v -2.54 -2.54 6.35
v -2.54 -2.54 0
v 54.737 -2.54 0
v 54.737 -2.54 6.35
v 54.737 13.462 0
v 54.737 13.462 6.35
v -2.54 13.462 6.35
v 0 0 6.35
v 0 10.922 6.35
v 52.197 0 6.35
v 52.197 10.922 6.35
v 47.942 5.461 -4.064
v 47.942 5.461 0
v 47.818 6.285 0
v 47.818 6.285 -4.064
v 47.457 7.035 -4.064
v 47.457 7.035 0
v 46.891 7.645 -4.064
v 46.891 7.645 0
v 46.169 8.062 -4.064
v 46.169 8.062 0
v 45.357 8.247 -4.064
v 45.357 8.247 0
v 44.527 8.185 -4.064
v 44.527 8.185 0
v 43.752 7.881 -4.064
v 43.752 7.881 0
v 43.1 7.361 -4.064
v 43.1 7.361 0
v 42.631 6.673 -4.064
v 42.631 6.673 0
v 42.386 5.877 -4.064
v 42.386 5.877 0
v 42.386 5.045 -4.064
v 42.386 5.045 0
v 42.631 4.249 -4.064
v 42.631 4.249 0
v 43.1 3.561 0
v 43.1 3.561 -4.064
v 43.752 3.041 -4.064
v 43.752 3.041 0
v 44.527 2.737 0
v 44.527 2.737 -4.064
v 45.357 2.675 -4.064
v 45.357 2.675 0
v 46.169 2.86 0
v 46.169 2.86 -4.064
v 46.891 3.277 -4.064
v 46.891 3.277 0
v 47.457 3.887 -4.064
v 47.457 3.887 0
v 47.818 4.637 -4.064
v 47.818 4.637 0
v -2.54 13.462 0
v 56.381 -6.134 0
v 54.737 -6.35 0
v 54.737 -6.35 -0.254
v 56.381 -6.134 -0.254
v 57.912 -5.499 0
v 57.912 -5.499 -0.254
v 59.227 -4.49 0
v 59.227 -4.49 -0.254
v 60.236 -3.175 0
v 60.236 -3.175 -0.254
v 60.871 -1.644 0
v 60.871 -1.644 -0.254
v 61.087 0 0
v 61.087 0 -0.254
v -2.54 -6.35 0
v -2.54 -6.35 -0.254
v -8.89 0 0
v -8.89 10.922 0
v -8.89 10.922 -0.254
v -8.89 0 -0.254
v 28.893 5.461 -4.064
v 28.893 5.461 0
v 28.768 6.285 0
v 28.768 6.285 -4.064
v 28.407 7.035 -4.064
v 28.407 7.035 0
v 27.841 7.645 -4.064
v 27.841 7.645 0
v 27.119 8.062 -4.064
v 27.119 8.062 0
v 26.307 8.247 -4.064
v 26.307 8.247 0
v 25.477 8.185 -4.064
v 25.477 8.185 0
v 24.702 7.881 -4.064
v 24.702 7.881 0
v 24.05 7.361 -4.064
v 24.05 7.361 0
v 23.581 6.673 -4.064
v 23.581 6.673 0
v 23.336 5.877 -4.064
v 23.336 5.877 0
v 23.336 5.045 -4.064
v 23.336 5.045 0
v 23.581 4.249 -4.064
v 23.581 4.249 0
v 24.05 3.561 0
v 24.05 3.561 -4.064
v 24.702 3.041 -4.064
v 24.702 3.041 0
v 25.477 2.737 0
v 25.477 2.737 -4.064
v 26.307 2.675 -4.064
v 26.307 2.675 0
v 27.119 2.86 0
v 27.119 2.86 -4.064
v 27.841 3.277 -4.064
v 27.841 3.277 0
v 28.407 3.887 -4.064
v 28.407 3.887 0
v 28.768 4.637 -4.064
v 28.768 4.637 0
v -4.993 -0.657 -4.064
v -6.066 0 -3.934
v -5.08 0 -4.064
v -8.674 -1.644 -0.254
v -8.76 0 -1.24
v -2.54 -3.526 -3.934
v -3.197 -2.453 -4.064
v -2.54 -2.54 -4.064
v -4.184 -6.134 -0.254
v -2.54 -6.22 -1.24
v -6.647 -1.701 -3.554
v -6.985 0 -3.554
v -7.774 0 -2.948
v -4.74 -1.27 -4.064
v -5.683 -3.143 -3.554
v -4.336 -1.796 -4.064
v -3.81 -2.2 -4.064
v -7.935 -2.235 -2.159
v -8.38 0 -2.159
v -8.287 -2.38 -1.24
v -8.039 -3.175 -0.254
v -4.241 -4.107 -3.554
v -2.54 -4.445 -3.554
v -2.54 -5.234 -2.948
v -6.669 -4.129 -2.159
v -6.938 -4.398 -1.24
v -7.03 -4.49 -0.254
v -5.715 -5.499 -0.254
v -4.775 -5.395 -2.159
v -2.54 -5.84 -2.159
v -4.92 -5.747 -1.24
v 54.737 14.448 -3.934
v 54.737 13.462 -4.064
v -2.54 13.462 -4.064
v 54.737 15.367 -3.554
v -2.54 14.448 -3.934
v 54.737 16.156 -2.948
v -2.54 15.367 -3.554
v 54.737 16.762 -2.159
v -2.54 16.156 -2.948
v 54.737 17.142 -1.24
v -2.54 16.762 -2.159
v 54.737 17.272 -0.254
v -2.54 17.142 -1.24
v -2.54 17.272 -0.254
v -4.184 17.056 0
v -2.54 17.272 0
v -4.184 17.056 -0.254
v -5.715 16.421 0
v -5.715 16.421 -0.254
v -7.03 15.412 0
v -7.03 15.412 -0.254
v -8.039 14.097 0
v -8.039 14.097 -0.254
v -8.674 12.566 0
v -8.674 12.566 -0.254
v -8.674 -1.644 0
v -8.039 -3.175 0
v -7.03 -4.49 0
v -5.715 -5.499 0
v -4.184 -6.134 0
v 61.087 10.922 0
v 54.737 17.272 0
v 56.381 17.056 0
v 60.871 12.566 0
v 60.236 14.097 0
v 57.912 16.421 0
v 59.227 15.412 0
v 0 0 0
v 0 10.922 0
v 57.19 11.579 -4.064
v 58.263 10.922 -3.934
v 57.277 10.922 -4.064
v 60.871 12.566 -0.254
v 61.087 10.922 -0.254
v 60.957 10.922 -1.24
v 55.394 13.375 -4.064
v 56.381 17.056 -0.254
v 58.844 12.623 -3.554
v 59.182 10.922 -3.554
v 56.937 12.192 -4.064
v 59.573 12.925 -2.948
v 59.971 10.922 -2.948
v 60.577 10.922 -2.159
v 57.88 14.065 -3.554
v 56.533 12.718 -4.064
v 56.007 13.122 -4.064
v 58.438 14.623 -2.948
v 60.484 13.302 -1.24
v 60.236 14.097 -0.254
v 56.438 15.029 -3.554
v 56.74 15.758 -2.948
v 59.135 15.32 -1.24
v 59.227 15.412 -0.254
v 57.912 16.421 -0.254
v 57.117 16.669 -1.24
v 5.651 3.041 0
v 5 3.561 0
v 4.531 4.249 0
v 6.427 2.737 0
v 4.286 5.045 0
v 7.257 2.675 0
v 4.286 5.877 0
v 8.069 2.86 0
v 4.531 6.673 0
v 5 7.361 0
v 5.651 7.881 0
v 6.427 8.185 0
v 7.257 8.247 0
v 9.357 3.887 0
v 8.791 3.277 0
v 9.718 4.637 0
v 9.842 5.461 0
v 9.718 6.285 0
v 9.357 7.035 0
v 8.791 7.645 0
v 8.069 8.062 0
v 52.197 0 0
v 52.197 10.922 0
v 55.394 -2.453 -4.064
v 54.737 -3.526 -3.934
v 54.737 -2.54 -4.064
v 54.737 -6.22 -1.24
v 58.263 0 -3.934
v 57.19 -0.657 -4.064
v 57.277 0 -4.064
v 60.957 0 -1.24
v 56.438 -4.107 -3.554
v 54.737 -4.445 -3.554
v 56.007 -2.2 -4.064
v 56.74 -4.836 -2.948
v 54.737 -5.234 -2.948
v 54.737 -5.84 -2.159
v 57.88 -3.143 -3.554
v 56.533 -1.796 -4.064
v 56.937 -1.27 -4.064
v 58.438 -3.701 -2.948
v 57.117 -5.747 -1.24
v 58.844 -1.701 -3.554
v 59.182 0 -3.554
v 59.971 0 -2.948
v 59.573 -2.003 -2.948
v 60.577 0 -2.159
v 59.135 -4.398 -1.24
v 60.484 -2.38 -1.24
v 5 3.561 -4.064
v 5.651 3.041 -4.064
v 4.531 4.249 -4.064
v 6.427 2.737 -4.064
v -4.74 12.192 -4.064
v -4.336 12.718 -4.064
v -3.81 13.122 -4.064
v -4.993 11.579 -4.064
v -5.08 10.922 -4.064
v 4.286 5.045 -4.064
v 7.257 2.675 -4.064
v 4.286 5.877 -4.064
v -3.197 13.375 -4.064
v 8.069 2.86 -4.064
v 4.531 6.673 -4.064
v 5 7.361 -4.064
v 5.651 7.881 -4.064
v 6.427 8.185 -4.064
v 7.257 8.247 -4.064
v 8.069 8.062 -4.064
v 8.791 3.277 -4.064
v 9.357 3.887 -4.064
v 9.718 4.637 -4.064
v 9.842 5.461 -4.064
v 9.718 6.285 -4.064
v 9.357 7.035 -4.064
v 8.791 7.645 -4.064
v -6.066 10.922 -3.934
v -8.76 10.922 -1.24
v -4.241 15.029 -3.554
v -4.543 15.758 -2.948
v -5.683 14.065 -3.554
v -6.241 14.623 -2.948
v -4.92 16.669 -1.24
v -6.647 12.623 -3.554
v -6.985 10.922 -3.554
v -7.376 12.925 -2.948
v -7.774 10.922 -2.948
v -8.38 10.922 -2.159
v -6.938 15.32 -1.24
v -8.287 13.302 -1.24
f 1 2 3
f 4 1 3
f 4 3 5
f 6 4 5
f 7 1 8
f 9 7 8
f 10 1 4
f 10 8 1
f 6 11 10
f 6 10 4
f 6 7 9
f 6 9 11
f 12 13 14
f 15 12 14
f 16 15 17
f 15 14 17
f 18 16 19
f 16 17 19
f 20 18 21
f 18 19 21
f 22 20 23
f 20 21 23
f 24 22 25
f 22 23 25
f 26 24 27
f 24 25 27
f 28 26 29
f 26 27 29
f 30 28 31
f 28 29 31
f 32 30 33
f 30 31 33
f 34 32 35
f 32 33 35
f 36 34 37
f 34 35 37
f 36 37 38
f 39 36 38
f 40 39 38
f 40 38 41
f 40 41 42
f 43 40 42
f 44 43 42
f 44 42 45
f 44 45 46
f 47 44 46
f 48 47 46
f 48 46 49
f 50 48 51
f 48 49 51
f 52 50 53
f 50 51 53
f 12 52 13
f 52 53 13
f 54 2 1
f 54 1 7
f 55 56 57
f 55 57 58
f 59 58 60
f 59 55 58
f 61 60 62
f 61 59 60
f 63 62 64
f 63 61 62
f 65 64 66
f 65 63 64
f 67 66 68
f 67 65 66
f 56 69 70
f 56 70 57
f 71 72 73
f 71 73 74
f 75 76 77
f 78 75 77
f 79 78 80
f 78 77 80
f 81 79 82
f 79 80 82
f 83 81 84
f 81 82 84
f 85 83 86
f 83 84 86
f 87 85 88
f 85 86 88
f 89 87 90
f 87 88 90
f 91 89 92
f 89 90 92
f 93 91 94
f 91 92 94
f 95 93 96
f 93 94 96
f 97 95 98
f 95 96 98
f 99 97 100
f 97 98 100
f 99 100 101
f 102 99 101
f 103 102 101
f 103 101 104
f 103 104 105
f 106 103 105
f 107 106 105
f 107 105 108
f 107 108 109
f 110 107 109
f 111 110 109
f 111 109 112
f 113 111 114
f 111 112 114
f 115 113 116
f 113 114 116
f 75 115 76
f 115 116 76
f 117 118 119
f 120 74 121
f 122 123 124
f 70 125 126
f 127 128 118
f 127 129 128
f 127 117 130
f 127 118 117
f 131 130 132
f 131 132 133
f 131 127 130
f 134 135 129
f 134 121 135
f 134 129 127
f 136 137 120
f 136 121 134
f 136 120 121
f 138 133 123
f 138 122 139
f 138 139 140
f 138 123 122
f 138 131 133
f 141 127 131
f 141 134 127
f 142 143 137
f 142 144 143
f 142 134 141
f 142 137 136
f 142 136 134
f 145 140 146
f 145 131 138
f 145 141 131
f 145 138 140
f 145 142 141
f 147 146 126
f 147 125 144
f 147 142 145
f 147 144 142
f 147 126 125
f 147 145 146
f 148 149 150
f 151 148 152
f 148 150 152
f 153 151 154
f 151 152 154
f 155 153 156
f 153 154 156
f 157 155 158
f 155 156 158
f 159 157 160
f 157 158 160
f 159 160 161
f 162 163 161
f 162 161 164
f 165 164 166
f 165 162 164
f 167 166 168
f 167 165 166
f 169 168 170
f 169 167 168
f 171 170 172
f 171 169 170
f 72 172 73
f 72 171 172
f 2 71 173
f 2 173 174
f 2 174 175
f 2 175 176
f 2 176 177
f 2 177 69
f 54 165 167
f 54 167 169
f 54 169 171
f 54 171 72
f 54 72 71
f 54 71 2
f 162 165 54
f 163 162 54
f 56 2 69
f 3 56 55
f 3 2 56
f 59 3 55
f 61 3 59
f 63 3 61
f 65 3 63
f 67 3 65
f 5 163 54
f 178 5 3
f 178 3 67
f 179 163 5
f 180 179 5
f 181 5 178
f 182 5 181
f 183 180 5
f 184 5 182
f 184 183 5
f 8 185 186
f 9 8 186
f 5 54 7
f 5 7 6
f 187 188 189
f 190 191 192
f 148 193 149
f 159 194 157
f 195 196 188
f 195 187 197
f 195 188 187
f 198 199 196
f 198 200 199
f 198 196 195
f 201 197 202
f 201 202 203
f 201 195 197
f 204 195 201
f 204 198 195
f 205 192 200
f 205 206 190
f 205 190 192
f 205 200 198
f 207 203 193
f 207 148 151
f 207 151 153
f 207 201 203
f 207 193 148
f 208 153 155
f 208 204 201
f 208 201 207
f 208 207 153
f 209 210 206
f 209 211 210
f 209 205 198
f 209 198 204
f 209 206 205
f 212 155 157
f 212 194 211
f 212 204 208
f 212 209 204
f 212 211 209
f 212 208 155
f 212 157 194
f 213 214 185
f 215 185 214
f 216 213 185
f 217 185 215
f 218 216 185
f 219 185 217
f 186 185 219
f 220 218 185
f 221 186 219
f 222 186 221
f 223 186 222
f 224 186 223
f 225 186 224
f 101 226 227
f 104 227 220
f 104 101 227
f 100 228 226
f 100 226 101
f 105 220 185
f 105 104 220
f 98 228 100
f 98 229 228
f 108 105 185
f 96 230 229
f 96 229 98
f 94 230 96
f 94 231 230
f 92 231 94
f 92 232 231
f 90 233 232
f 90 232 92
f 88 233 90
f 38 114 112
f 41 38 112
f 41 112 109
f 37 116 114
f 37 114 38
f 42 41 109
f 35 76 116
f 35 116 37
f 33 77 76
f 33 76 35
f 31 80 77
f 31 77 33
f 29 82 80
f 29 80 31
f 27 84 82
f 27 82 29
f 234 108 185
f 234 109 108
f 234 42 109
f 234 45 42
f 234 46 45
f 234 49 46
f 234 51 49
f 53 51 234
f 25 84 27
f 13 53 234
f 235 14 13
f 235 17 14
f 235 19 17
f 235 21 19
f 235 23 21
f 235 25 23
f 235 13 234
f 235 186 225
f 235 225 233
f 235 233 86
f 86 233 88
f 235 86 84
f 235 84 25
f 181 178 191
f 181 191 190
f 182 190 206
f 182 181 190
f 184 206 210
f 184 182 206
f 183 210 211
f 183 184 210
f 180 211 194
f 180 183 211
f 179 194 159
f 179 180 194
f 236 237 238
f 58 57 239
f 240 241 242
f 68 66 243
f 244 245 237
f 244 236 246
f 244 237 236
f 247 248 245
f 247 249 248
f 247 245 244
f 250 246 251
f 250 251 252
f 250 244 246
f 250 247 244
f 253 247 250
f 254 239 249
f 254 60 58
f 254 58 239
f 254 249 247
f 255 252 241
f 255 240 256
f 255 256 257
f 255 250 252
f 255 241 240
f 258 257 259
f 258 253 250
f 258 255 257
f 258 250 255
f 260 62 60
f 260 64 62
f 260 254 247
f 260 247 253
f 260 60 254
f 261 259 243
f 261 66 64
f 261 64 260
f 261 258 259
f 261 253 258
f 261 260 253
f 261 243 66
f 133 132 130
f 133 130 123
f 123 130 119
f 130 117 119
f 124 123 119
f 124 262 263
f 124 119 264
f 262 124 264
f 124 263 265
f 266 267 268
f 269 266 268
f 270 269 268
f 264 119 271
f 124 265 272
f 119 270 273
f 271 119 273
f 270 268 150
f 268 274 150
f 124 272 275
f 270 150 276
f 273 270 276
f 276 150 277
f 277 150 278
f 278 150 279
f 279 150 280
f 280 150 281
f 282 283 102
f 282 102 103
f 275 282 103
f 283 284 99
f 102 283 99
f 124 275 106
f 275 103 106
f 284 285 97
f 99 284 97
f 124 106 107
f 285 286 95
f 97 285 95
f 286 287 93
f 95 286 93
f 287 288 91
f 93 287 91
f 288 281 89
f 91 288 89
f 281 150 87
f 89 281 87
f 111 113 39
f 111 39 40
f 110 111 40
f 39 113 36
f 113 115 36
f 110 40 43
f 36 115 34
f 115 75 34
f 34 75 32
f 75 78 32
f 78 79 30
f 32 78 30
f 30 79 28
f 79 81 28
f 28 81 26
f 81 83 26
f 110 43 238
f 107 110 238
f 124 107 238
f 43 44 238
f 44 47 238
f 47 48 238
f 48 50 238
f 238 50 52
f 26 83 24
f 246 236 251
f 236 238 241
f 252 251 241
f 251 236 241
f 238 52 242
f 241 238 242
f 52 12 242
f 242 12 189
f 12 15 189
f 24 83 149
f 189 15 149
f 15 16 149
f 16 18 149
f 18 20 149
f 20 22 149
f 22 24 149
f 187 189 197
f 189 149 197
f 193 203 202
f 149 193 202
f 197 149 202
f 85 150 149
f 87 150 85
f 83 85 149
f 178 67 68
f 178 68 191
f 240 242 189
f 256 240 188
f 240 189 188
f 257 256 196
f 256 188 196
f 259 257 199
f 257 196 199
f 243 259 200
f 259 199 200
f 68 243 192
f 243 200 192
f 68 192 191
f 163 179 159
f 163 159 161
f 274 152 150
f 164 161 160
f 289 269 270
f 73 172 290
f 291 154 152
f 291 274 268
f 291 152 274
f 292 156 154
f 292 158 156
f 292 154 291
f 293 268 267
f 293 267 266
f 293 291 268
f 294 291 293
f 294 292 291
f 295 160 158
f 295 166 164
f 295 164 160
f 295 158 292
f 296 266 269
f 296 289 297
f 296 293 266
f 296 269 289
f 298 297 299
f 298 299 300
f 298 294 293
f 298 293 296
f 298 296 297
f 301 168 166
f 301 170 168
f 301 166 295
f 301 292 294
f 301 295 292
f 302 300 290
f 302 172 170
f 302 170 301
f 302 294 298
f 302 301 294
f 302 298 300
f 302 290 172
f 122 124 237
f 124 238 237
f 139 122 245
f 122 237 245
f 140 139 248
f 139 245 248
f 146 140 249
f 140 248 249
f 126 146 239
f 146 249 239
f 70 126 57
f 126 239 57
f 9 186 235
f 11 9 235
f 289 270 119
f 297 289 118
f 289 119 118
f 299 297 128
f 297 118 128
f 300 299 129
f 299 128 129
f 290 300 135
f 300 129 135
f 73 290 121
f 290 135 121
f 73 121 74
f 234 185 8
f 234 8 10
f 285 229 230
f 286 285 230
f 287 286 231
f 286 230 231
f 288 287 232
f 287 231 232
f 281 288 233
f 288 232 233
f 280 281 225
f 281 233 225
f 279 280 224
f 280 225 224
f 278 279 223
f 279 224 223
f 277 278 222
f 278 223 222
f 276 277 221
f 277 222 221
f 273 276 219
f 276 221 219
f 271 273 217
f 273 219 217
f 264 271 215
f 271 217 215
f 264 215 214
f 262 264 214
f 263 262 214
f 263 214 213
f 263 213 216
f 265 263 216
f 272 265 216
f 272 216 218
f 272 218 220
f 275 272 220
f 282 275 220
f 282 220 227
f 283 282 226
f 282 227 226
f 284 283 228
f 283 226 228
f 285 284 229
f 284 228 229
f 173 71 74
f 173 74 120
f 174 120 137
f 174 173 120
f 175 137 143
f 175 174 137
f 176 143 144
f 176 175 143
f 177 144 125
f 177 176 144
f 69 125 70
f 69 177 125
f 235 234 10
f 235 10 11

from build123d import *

# Parameters (mm, degrees)
F0_W     = 57.277
F0_H     = 16.002
F0_W_2   = 52.197
F0_H_2   = 10.922
F0_R     = 2.794
F1_DEPTH = 4.064
F2_DEPTH = 6.35
F3_R     = 3.81


with BuildPart() as f1:
    # F0 (on Top) → F1 (new body)
    with BuildSketch(Plane.XY):
        with BuildLine():
            Line((54.737, 17.272), (-2.54, 17.272))
            ThreePointArc((-2.54, 17.272), (-7.030128, 15.412128), (-8.89, 10.922))
            Line((-8.89, 10.922), (-8.89, 0))
            ThreePointArc((-8.89, 0), (-7.030128, -4.490128), (-2.54, -6.35))
            Line((-2.54, -6.35), (54.737, -6.35))
            ThreePointArc((54.737, -6.35), (59.227128, -4.490128), (61.087, 0))
            Line((61.087, 0), (61.087, 10.922))
            ThreePointArc((61.087, 10.922), (59.227128, 15.412128), (54.737, 17.272))
        make_face()
        with Locations((26.0985, 5.461)):
            Rectangle(F0_W, F0_H, mode=Mode.SUBTRACT)
        with Locations((26.0985, 5.461)):
            Rectangle(F0_W, F0_H)
        with Locations((26.0985, 5.461)):
            Rectangle(F0_W_2, F0_H_2, mode=Mode.SUBTRACT)
        with Locations((26.0985, 5.461)):
            Rectangle(F0_W_2, F0_H_2)
        with Locations((7.0485, 5.461)):
            Circle(F0_R, mode=Mode.SUBTRACT)
        with Locations((26.0985, 5.461)):
            Circle(F0_R, mode=Mode.SUBTRACT)
        with Locations((45.1485, 5.461)):
            Circle(F0_R, mode=Mode.SUBTRACT)
    extrude(amount=-F1_DEPTH)

    # F0 (on Top) → F2 (join)
    with BuildSketch(Plane.XY):
        with Locations((26.0985, 5.461)):
            Rectangle(F0_W, F0_H)
        with Locations((26.0985, 5.461)):
            Rectangle(F0_W_2, F0_H_2, mode=Mode.SUBTRACT)
    extrude(amount=F2_DEPTH)

    # F3
    f3_edges = [f1.edges().sort_by_distance(p)[0] for p in [
        (26.0985, -6.35, -4.064),
    ]]
    fillet(f3_edges, radius=F3_R)


solid = f1.part
